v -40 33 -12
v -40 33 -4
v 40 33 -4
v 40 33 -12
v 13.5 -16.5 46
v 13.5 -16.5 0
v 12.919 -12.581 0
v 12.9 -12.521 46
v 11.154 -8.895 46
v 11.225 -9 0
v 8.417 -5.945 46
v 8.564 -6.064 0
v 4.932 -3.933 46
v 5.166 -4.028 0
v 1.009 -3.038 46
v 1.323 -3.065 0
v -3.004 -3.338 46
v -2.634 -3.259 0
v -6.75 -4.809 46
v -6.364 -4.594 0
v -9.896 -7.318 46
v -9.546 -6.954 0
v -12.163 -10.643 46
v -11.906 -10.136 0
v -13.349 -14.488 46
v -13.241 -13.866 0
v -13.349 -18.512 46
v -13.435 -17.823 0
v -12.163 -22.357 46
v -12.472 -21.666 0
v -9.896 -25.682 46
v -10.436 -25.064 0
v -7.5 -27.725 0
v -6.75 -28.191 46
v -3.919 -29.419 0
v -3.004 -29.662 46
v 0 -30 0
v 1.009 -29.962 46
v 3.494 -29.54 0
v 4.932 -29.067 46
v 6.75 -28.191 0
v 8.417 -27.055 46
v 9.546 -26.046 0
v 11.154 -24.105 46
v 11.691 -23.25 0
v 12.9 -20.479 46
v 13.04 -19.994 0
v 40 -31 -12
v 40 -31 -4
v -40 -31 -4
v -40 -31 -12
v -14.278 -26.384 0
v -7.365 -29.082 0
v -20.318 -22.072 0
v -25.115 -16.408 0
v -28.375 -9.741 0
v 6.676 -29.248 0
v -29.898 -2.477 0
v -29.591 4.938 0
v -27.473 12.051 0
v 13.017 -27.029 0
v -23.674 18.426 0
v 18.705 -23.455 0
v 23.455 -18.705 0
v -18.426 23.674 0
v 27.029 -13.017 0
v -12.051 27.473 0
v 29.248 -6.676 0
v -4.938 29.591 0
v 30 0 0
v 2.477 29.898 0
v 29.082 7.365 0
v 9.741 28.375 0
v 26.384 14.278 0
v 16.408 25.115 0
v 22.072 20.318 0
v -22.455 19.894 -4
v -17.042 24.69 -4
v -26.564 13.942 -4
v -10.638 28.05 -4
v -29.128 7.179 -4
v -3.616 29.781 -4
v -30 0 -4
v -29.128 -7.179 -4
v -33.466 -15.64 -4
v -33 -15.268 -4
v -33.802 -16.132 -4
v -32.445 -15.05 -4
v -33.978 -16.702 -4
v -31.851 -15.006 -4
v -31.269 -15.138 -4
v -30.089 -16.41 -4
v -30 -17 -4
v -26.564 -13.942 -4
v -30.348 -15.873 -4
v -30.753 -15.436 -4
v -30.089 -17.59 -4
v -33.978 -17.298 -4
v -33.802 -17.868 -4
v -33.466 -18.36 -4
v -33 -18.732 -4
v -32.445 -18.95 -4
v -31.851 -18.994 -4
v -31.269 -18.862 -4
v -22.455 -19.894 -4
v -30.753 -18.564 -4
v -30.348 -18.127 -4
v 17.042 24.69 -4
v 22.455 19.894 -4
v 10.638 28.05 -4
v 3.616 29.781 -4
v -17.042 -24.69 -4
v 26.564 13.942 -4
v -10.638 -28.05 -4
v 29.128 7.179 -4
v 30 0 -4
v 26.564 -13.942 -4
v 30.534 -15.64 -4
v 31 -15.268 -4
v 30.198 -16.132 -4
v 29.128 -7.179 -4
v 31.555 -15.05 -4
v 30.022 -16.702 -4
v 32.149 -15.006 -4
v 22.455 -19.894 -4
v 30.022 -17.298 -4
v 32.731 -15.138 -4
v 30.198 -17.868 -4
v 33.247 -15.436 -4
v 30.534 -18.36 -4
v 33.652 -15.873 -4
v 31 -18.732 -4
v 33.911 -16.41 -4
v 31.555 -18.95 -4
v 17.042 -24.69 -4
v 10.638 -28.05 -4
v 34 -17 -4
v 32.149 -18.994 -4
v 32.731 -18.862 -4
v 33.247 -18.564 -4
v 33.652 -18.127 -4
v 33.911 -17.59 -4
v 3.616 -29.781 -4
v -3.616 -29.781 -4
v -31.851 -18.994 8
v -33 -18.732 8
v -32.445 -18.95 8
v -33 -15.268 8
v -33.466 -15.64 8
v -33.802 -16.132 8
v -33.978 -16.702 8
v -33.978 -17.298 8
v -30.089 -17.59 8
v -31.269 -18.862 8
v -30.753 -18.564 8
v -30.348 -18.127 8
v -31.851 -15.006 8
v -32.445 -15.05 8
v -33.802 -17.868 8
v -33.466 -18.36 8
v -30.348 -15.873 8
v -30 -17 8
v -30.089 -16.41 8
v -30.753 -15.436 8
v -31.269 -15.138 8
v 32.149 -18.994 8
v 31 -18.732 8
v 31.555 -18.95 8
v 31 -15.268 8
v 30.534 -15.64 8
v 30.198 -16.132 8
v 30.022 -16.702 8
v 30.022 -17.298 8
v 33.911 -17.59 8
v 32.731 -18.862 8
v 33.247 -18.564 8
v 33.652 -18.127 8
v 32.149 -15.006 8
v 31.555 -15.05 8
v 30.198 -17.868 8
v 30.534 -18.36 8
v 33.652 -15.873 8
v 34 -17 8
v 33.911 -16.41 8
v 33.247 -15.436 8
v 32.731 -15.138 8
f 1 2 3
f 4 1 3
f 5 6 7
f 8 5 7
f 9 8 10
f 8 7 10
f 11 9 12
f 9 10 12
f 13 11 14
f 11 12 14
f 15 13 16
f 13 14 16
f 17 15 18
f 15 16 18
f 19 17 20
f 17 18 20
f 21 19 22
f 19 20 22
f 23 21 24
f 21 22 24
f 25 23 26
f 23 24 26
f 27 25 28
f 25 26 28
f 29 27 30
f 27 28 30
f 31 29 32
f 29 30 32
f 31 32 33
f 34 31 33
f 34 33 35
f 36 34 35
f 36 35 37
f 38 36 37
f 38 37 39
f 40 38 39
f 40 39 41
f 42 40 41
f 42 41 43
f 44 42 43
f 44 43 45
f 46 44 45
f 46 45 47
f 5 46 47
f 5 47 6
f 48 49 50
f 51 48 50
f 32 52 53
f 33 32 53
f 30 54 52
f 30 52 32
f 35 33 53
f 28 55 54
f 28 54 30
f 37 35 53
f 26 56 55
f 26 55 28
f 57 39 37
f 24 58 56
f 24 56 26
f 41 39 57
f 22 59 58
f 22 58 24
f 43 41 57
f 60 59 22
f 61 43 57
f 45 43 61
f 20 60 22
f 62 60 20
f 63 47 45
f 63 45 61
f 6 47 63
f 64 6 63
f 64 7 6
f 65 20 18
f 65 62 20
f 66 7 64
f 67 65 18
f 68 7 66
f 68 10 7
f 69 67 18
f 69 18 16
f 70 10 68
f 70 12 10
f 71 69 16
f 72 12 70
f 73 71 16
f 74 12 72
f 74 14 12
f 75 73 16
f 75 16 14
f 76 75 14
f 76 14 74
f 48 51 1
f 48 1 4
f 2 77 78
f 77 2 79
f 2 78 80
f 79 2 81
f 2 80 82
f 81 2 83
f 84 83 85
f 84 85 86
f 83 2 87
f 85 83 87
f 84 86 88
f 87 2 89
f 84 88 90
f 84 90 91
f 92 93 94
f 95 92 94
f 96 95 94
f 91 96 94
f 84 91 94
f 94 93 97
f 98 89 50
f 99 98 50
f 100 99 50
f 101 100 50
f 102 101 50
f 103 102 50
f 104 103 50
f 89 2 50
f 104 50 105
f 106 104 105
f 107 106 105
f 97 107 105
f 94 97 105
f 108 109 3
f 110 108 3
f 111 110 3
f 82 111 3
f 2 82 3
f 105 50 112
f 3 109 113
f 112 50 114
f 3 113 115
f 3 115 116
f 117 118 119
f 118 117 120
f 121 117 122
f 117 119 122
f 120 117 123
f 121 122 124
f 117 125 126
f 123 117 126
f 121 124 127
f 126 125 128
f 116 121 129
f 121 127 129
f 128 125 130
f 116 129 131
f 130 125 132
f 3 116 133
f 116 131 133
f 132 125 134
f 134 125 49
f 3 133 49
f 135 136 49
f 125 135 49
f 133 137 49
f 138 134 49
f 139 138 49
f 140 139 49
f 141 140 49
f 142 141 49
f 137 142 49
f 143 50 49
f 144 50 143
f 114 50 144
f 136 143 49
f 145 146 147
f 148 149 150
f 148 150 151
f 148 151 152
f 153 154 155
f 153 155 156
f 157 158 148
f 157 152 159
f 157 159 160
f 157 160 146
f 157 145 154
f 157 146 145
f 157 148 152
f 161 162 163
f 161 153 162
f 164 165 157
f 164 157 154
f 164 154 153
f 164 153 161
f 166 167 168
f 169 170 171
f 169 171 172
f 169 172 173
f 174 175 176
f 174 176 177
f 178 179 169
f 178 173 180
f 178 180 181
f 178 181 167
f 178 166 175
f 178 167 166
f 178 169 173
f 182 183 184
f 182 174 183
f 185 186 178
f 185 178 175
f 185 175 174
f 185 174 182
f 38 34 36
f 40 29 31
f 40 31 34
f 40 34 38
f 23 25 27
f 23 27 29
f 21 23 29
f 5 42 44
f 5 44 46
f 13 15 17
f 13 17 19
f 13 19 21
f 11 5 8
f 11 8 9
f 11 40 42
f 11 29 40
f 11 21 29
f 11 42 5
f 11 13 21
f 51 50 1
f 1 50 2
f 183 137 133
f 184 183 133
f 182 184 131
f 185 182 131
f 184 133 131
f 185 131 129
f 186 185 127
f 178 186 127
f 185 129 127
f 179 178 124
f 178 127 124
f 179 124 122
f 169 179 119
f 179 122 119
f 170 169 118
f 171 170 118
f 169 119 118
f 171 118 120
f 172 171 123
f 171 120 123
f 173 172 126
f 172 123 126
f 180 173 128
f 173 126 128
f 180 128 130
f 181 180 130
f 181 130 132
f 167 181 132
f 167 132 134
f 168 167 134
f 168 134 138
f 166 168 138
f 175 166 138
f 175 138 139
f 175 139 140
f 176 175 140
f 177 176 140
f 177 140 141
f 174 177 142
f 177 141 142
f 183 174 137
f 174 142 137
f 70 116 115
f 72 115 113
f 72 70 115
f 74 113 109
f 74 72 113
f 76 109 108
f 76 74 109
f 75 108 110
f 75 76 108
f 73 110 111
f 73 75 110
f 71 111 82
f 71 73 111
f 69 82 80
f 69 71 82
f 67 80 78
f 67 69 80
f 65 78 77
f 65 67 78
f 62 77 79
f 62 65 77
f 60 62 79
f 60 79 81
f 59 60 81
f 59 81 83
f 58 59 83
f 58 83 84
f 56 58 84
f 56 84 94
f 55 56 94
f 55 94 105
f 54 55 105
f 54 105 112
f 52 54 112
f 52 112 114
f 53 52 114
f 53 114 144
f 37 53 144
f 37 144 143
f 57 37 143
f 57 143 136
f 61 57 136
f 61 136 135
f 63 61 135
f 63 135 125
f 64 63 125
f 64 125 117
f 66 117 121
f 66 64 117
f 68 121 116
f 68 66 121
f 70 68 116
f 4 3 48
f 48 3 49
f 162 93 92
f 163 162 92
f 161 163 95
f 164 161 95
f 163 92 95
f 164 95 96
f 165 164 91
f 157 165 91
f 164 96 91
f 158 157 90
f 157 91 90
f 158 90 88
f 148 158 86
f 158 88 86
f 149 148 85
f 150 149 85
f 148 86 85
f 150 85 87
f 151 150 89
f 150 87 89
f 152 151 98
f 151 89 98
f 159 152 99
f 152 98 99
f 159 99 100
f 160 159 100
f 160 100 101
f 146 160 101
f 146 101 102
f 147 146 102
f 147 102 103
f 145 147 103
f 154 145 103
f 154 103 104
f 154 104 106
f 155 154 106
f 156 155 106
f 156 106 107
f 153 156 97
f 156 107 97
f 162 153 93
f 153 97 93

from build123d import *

# Parameters (mm, degrees)
F0_R     = 30
F1_DEPTH = 4
F3_DEPTH = 8
F4_R     = 2
F5_DEPTH = 12
F6_R     = 13.5
F7_DEPTH = 50


with BuildPart() as f1:
    # F0 (on Top) → F1 (new body)
    with BuildSketch(Plane.XY):
        Circle(F0_R)
    extrude(amount=-F1_DEPTH)

    # F2 (on face) → F3 (join)
    with BuildSketch(Plane(origin=(0, 0, -4), x_dir=(1, 0, 0), z_dir=(0, 0, -1))):
        Polygon((-40, 31), (-40, -33), (40, -33), (40, 31), (0, 31), align=None)
        with BuildLine():
            ThreePointArc((30, 0), (-21.2132034356, -21.2132034356), (0, 30))
            ThreePointArc((0, 30), (21.2132034356, 21.2132034356), (30, 0))
        make_face(mode=Mode.SUBTRACT)
        with BuildLine():
            ThreePointArc((30, 0), (21.2132034356, 21.2132034356), (0, 30))
            ThreePointArc((0, 30), (-21.2132034356, -21.2132034356), (30, 0))
        make_face()
    extrude(amount=F3_DEPTH)

    # F4 (on face) → F5 (join)
    with BuildSketch(Plane.XY.offset(-4)):
        with Locations((-32, -17)):
            Circle(F4_R)
        with Locations((32, -17)):
            Circle(F4_R)
    extrude(amount=F5_DEPTH)

    # F6 (on face) → F7 (join)
    with BuildSketch(Plane.XY.offset(-4)):
        with Locations((0, -16.5)):
            Circle(F6_R)
    extrude(amount=F7_DEPTH)


solid = f1.part
